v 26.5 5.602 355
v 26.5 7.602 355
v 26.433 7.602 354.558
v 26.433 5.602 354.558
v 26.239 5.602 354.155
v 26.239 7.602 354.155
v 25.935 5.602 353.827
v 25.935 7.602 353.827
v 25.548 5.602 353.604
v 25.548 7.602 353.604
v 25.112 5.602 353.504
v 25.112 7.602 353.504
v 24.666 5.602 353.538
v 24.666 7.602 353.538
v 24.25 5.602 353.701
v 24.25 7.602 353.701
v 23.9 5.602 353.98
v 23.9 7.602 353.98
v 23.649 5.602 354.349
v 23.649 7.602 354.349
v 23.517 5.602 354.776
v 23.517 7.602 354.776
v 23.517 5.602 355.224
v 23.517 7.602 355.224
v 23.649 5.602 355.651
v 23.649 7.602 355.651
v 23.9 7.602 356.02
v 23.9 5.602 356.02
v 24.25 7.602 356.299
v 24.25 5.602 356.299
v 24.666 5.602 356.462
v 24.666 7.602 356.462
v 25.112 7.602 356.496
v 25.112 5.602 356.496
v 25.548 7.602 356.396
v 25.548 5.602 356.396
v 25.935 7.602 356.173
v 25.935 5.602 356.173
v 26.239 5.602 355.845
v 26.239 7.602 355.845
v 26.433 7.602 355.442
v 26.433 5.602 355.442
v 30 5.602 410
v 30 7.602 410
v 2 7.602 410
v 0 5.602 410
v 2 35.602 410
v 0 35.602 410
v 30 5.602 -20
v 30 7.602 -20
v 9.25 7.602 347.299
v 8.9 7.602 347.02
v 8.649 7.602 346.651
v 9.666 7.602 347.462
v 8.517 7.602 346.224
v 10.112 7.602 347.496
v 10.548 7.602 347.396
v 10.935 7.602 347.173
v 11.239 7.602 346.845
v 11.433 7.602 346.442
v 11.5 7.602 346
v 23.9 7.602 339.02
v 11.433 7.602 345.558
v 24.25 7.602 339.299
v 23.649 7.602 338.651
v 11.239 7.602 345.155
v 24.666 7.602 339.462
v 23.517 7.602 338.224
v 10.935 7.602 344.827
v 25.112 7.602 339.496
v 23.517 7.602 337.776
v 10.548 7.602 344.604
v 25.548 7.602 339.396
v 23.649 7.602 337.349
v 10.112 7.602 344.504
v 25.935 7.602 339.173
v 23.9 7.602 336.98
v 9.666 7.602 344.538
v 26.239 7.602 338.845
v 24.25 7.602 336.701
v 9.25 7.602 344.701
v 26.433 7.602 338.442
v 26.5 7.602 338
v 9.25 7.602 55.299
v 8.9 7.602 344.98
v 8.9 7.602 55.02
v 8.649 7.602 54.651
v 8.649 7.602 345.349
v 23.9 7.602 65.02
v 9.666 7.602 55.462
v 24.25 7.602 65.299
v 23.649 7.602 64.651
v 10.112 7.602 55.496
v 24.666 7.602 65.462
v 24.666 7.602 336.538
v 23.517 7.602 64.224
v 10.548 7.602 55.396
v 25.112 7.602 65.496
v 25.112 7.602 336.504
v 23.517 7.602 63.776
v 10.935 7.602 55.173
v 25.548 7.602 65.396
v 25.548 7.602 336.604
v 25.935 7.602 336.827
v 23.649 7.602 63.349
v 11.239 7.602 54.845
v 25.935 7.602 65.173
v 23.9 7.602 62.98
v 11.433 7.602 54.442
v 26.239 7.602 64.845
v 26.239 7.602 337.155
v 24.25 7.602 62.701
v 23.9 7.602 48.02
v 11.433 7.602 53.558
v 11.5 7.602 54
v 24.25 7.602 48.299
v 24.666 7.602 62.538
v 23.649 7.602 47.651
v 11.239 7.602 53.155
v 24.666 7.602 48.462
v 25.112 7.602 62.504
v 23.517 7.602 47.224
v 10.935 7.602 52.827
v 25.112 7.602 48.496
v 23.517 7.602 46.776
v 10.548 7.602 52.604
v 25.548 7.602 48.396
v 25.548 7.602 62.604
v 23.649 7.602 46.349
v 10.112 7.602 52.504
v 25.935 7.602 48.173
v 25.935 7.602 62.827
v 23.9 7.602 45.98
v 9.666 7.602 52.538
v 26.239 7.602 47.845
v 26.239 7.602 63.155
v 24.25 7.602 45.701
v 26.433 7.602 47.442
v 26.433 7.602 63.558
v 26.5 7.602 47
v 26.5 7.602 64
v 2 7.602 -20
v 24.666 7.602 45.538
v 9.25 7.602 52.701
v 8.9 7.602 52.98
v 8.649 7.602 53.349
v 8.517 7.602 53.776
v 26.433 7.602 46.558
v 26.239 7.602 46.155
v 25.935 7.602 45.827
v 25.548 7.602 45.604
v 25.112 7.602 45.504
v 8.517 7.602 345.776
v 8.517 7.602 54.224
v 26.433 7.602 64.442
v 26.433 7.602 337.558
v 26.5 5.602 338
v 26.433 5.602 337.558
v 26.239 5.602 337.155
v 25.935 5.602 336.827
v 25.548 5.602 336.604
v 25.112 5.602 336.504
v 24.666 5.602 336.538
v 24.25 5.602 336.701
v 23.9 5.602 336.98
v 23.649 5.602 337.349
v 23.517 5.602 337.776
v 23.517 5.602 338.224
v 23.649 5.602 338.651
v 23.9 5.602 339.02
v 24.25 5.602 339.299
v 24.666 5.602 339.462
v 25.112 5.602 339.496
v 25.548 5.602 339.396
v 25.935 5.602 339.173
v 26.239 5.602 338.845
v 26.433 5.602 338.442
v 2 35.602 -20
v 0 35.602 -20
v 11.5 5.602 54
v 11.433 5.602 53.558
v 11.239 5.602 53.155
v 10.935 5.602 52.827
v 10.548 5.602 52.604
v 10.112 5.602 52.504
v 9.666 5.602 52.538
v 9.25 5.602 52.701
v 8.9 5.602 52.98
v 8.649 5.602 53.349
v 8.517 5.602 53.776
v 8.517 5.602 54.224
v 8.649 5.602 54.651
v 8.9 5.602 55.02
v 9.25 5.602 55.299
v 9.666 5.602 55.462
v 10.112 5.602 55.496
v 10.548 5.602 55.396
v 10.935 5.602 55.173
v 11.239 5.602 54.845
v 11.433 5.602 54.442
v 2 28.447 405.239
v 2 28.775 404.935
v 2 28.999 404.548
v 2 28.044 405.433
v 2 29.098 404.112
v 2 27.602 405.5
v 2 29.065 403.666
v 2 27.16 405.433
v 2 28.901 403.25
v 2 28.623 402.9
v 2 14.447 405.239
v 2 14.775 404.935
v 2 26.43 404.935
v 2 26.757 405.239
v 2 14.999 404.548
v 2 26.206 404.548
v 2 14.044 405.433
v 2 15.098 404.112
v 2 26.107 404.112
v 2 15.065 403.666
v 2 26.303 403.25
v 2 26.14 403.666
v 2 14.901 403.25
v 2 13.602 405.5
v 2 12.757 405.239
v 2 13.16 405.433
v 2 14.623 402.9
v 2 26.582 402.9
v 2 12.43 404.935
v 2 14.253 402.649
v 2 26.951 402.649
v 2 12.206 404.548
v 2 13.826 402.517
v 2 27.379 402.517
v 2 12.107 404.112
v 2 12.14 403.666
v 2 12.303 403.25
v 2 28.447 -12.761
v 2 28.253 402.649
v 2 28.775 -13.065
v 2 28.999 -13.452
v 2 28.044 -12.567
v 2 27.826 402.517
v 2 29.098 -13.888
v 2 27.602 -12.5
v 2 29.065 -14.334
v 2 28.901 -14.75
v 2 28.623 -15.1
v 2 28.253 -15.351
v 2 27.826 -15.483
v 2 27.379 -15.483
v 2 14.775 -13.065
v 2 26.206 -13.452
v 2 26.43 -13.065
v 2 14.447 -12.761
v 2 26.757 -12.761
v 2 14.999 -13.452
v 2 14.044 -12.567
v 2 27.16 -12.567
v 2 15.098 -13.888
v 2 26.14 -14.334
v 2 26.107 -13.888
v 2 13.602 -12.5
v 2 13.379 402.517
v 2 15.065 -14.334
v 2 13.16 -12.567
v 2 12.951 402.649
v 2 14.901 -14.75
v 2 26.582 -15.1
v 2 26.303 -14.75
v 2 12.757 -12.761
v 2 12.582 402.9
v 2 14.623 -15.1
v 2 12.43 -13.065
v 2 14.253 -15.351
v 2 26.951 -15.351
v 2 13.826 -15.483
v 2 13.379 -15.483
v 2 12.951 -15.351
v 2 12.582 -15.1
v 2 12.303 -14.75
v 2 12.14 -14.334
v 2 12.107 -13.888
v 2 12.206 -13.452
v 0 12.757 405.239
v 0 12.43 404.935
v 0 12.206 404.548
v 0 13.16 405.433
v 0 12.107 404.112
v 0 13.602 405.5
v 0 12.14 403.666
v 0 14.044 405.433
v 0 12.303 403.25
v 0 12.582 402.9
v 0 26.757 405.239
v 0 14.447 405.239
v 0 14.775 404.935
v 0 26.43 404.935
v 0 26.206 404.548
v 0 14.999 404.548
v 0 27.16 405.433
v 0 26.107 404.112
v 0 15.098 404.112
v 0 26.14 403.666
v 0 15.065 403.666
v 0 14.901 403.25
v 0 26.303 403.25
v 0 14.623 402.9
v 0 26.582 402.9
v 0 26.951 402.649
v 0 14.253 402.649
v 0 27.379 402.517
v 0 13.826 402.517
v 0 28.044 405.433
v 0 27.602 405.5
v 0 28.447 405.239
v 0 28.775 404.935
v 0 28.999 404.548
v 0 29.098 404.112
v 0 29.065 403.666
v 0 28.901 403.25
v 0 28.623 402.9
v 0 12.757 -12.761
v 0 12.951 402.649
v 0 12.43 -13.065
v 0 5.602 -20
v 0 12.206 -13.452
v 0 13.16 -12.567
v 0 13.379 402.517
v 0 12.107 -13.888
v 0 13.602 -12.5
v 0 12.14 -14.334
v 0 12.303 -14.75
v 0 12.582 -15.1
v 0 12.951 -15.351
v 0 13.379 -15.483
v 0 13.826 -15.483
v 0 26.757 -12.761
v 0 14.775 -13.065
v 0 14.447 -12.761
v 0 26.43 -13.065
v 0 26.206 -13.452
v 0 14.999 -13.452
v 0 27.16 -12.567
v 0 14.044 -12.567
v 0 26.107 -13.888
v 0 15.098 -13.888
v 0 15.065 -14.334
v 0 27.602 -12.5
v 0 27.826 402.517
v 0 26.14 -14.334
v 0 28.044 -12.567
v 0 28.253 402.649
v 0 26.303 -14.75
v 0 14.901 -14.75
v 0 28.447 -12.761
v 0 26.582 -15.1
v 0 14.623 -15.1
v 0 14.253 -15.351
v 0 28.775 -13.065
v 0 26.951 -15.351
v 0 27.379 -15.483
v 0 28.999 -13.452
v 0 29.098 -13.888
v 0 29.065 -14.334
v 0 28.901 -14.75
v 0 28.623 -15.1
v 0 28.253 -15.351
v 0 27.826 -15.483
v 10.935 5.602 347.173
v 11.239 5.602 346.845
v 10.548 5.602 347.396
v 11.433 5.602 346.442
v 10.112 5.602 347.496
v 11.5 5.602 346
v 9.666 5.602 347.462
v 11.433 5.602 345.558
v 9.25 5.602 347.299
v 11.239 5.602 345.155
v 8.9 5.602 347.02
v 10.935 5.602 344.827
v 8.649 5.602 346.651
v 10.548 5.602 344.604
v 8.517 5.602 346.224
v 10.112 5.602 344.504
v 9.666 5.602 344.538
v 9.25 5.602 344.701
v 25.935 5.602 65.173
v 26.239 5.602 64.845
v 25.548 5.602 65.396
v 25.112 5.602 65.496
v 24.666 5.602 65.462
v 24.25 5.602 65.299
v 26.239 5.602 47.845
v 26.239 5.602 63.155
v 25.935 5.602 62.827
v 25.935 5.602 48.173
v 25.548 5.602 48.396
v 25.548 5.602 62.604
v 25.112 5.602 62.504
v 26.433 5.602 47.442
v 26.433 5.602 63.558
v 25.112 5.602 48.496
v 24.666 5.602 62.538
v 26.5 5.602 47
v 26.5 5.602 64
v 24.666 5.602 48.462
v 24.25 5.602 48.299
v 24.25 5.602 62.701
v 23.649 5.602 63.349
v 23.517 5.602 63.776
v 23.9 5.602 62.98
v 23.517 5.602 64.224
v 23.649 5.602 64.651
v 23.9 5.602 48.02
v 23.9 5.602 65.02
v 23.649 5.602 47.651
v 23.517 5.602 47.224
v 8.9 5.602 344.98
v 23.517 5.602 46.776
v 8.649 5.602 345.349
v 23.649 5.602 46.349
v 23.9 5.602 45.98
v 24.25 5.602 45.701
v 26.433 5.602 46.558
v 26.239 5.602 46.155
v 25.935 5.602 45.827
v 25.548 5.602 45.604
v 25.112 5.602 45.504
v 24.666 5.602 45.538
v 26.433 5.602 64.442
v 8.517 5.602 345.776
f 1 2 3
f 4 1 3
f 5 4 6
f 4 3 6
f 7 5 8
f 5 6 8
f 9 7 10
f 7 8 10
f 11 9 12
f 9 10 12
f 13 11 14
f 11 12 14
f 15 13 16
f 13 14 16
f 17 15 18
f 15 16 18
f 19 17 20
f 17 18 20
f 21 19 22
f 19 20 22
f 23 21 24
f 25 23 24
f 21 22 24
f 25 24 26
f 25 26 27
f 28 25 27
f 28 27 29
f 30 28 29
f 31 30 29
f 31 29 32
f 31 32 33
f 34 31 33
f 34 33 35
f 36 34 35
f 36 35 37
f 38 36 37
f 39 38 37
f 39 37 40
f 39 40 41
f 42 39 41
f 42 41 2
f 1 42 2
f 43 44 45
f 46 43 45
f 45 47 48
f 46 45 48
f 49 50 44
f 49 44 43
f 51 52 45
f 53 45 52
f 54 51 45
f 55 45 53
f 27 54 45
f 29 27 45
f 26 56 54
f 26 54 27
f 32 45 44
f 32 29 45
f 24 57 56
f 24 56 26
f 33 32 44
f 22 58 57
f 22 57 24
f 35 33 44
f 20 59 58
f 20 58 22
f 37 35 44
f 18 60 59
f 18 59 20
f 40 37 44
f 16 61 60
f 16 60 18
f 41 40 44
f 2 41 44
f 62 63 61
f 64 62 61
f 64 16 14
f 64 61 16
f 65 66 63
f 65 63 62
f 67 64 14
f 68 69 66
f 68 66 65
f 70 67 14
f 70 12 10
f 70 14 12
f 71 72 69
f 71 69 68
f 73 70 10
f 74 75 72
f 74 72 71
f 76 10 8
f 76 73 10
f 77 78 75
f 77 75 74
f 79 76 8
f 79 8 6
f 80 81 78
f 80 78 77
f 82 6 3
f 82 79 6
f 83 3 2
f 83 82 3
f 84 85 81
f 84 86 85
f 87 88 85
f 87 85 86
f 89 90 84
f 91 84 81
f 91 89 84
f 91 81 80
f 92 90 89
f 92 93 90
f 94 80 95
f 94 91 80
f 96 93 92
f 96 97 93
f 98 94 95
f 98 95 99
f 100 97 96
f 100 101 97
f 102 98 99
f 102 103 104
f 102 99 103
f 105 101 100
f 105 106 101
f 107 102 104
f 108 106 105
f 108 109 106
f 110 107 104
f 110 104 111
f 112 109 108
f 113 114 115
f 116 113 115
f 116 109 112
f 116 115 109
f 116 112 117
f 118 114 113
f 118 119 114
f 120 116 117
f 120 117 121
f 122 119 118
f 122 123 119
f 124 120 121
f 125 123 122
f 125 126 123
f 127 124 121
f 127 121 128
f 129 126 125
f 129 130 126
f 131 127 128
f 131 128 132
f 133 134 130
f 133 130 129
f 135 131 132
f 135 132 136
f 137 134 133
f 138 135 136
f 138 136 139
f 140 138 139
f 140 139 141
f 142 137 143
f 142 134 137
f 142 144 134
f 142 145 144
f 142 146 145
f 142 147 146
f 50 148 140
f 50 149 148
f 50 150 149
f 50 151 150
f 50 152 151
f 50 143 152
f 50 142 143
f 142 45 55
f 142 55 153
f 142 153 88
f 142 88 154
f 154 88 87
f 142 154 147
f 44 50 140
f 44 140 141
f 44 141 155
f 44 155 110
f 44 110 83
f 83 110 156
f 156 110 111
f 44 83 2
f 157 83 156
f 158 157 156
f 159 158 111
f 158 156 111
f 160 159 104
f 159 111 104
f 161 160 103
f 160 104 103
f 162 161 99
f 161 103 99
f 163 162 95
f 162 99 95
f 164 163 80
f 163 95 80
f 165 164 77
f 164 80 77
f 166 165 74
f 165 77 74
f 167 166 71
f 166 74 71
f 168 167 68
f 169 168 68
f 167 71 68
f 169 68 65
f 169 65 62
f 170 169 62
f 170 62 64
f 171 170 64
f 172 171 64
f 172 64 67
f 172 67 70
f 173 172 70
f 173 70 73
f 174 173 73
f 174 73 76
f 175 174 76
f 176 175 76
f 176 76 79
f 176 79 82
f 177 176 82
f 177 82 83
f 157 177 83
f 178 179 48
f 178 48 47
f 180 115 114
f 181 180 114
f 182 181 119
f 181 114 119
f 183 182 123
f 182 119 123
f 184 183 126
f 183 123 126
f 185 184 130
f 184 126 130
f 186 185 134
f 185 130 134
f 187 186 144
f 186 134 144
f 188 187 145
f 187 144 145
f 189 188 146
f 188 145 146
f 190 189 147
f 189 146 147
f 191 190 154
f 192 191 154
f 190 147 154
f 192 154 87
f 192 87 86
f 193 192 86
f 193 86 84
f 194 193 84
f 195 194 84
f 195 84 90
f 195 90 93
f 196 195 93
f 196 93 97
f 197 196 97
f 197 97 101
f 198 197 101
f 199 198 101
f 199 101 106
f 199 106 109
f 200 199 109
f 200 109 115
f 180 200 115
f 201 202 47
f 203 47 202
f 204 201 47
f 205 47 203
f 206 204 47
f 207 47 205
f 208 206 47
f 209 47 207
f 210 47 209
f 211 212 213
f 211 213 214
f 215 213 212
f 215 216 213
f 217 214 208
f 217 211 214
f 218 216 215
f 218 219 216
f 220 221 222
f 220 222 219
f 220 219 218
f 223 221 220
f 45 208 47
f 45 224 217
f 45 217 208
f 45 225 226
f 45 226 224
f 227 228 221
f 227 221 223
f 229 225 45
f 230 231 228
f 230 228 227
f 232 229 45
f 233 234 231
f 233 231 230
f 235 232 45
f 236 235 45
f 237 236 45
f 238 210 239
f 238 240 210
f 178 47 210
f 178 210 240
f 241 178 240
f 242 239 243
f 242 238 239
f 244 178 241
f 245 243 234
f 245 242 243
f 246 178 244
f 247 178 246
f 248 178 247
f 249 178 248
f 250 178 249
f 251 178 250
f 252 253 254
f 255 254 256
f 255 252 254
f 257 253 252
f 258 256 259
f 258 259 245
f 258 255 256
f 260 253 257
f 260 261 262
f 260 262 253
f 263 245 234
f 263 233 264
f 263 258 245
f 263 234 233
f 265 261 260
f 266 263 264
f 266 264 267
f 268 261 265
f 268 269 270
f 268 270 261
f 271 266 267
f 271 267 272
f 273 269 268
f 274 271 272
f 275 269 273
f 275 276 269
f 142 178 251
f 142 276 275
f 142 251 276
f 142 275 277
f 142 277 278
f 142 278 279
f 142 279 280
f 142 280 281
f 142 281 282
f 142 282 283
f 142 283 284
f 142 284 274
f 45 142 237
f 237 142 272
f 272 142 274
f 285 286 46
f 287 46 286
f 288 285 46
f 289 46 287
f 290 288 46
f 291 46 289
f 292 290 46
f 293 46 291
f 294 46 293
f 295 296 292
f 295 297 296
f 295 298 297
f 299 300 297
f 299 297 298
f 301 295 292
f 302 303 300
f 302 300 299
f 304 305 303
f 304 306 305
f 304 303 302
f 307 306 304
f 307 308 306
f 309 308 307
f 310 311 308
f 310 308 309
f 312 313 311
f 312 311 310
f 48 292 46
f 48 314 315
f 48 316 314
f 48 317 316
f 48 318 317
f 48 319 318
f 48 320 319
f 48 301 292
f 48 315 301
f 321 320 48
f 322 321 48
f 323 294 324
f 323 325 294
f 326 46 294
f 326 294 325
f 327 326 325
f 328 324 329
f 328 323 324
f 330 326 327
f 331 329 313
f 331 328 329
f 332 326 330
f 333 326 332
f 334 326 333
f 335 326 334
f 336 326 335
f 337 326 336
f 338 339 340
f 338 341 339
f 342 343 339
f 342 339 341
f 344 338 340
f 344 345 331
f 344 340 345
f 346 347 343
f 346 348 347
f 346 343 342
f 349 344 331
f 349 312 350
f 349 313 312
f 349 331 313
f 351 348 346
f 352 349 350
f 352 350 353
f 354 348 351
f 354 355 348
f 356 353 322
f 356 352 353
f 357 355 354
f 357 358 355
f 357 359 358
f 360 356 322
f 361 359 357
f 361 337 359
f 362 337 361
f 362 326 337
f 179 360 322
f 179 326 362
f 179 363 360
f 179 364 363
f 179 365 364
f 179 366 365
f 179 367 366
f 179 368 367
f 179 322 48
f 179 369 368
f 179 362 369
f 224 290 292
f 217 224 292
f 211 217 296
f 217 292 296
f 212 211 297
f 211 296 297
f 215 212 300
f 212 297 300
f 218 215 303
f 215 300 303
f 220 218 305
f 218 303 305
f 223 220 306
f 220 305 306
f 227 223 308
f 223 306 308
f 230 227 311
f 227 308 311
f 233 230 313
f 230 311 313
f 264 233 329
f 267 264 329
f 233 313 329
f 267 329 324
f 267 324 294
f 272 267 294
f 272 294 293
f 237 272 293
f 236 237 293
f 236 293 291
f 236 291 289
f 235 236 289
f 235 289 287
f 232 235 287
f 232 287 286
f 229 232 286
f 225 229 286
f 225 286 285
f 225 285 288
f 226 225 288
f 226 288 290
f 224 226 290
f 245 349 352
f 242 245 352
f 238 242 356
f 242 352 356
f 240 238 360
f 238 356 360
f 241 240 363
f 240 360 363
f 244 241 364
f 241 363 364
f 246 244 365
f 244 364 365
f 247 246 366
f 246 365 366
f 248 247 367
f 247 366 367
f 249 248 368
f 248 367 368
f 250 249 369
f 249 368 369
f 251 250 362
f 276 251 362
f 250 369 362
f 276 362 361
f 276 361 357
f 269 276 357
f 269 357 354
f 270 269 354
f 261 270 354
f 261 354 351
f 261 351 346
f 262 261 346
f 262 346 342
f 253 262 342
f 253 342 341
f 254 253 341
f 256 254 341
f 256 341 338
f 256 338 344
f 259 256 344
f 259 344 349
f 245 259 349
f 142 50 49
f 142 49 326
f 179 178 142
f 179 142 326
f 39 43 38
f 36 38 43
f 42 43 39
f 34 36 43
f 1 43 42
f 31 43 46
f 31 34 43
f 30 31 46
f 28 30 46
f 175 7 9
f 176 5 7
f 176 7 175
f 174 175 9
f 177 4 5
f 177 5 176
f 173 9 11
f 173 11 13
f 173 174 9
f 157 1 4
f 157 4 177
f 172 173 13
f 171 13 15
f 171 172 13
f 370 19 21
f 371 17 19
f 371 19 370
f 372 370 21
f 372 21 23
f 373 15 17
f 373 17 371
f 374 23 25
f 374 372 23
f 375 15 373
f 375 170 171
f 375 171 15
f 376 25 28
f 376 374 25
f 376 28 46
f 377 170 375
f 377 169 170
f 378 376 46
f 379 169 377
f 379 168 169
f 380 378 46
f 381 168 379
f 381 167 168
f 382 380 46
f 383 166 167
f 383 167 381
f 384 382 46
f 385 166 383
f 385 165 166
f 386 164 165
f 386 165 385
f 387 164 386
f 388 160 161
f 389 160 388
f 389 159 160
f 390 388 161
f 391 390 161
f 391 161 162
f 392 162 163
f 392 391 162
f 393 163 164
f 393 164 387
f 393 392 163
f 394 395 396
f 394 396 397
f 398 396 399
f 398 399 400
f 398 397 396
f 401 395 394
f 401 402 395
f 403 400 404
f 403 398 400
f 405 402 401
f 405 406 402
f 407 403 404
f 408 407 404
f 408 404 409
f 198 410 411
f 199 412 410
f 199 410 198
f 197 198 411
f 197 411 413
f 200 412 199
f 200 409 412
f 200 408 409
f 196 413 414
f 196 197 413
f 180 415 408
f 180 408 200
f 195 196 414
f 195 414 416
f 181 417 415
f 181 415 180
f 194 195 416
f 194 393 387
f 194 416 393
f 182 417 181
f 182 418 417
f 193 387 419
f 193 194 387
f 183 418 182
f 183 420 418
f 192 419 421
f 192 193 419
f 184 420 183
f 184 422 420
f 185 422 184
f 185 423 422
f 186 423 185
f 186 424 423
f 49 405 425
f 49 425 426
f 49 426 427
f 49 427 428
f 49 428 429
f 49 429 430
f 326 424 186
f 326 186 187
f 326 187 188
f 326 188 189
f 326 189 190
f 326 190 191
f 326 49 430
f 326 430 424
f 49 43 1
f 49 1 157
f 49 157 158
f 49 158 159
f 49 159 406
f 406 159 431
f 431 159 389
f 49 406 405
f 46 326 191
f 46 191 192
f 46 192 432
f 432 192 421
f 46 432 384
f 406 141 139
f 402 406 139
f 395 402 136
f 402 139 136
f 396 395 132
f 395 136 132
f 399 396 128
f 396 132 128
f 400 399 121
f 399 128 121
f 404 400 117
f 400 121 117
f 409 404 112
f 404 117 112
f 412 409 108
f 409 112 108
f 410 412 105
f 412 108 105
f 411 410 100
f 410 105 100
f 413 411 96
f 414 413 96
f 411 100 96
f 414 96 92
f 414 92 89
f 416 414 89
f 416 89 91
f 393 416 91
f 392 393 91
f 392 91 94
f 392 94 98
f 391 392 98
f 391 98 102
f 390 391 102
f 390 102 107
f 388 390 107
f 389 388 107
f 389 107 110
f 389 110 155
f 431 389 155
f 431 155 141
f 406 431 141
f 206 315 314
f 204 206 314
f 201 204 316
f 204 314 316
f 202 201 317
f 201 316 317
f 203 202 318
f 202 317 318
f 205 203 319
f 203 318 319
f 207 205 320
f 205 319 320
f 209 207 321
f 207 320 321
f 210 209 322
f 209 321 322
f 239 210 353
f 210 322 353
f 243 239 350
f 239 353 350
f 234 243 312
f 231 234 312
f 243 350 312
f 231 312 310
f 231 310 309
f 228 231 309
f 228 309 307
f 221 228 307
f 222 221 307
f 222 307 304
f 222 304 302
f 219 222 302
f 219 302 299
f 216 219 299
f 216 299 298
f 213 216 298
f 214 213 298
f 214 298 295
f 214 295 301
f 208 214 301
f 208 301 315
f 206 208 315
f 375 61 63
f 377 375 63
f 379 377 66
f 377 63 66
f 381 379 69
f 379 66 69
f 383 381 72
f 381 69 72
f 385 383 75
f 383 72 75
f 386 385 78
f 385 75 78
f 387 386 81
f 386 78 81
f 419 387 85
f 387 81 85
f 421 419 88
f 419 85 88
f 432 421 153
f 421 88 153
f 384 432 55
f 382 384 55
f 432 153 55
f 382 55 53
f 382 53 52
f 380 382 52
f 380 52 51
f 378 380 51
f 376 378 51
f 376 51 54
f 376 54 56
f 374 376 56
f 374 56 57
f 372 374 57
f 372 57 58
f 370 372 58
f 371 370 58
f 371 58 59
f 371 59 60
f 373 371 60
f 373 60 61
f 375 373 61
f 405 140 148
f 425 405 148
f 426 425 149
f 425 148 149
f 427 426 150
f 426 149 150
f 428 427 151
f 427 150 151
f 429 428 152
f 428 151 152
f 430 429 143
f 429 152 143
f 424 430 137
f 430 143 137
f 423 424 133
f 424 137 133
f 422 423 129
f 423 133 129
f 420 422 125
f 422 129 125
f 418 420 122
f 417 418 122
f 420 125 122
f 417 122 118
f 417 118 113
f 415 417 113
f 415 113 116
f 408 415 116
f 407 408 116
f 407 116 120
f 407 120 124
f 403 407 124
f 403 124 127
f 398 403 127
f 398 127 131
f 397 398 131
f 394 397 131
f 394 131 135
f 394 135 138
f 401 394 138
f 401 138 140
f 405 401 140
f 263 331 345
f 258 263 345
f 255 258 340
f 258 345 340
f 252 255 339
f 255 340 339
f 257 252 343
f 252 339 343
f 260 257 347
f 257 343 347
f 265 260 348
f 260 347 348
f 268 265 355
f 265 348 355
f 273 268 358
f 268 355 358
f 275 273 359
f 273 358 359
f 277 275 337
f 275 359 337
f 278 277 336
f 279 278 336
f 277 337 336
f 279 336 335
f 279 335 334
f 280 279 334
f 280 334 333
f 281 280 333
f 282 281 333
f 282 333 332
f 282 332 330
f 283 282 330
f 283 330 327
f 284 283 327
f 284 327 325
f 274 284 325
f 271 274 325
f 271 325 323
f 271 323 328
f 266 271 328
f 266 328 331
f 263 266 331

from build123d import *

# Parameters (mm, degrees)
BOSS_EXTRUDE1_DEPTH      = 410
BOSS_EXTRUDE1_DEPTH_BACK = 20
F_3_0_3_DIAMETER_HOLE1_D = 3
F_3_0_3_DIAMETER_HOLE2_D = 3
F_3_0_3_DIAMETER_HOLE3_D = 3
F_3_0_3_DIAMETER_HOLE4_D = 3


with BuildPart() as part:
    # Sketch1 → Boss-Extrude1 (new, two sides: drawn at the far end of the back side and taken through both)
    with BuildSketch(Plane.XY.offset(-BOSS_EXTRUDE1_DEPTH_BACK)):
        Polygon((0, 5.602318429), (0, 35.602318429), (2, 35.602318429), (2, 7.602318429), (30, 7.602318429), (30, 5.602318429), align=None)
    extrude(amount=BOSS_EXTRUDE1_DEPTH + BOSS_EXTRUDE1_DEPTH_BACK)

    # Ø3.0 (3) Diameter Hole1 (through all)
    with Locations(Plane(origin=(2, -3.805314364, 221.32004832), x_dir=(0, 0, -1), z_dir=(1, 0, 0))):
        with Locations((-182.67995168, 17.407632793), (-182.67995168, 31.407632793)):
            Hole(F_3_0_3_DIAMETER_HOLE1_D / 2)

    # Ø3.0 (3) Diameter Hole2 (through all)
    with Locations(Plane(origin=(2, -3.805314364, 221.32004832), x_dir=(0, 0, -1), z_dir=(1, 0, 0))):
        with Locations((235.32004832, 17.407632793), (235.32004832, 31.407632793)):
            Hole(F_3_0_3_DIAMETER_HOLE2_D / 2)

    # Ø3.0 (3) Diameter Hole3 (through all)
    with Locations(Plane(origin=(130.861996081, 5.602318429, 221.32004832), x_dir=(-1, 0, 0), z_dir=(0, -1, 0))):
        with Locations((105.861996081, -133.67995168), (120.861996081, -124.67995168), (105.861996081, -116.67995168)):
            Hole(F_3_0_3_DIAMETER_HOLE3_D / 2)

    # Ø3.0 (3) Diameter Hole4 (through all)
    with Locations(Plane(origin=(130.861996081, 5.602318429, 221.32004832), x_dir=(-1, 0, 0), z_dir=(0, -1, 0))):
        with Locations((105.861996081, 174.32004832), (105.861996081, 157.32004832), (120.861996081, 167.32004832)):
            Hole(F_3_0_3_DIAMETER_HOLE4_D / 2)


solid = part.part
